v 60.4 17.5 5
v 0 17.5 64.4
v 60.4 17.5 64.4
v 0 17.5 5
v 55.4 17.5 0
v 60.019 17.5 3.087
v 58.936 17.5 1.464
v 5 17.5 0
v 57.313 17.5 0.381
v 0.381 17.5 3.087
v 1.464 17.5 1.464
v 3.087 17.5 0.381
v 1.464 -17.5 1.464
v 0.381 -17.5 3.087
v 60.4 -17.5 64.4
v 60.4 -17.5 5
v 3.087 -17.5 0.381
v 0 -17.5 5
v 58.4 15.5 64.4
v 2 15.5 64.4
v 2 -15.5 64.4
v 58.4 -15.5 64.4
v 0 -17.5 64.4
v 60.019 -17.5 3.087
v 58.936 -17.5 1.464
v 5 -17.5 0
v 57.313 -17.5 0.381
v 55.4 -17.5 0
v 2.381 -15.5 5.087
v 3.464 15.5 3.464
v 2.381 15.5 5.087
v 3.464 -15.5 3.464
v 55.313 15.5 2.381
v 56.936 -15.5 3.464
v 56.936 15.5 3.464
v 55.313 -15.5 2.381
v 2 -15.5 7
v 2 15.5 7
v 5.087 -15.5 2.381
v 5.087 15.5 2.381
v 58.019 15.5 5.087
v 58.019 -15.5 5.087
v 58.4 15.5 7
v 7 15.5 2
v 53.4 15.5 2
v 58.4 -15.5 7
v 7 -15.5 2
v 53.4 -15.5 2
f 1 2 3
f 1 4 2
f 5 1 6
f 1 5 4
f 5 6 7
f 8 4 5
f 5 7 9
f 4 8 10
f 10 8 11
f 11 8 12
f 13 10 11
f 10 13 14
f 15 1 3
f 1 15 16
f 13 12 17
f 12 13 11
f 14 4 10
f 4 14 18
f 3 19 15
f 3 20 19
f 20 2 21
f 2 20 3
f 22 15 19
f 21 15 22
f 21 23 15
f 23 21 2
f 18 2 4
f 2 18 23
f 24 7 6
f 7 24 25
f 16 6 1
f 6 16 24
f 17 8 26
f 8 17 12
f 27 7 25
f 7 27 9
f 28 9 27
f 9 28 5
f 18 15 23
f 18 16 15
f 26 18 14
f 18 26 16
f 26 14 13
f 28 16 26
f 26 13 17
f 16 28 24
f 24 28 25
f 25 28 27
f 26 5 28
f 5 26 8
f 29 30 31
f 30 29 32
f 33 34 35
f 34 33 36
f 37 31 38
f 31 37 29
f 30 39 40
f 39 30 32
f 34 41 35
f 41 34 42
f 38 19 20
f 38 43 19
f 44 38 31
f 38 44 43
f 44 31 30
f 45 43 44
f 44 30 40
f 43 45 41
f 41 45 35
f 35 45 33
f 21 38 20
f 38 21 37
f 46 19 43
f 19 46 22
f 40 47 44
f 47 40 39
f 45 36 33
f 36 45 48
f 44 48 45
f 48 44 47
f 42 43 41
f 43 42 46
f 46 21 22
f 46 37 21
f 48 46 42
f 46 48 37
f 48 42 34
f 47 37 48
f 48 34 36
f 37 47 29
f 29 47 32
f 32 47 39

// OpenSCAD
// This is to hold Uno cards in a stack. Deck measurments have a small tolerance, except for the thickness of the pack (for a snug fit)
// Designed for Uno Disney 100 card pack
uno_width = 56.4;
uno_height = 82.2;
uno_thickness = 31;
uno_corner_radius = 5;

relative_height = 3/4;
wall_thickness = 2;

rotate([90,0,0]){
    difference(){
        /*color("red", 0.1)
        // Reference rectangle for the holder
        square([uno_width+wall_thickness*2, uno_height+wall_thickness]);

        // Reference rectangle for the pack
        color("red", 0.1)
        translate([wall_thickness, wall_thickness,0])
        square([uno_width, uno_height]);*/

        // Holder
        color("orange",0.3)
        linear_extrude(uno_thickness+wall_thickness*2, center = true)
        hull(){
            translate([uno_corner_radius, uno_corner_radius, 0])
            circle(uno_corner_radius);

            translate([uno_corner_radius, (uno_height-uno_corner_radius+wall_thickness)*relative_height, 0])
            square(uno_corner_radius*2, center = true);

            translate([uno_width+wall_thickness*2-uno_corner_radius, uno_corner_radius, 0])
            circle(uno_corner_radius);

            translate([uno_width+wall_thickness*2-uno_corner_radius, (-uno_corner_radius+wall_thickness+uno_height)*relative_height, 0])
            square(uno_corner_radius*2, center = true);
        }
        
                // Card pack
        color("white",0.3)
        linear_extrude(uno_thickness, center = true)
        hull(){
            translate([uno_corner_radius+wall_thickness, uno_corner_radius+wall_thickness, 0])
            circle(uno_corner_radius);

            translate([uno_corner_radius+wall_thickness, -uno_corner_radius+wall_thickness+uno_height, 0])
            circle(uno_corner_radius);

            translate([uno_width-uno_corner_radius+wall_thickness, uno_corner_radius+wall_thickness, 0])
            circle(uno_corner_radius);

            translate([uno_width-uno_corner_radius+wall_thickness, -uno_corner_radius+wall_thickness+uno_height, 0])
            circle(uno_corner_radius);    
        }
    }
}
